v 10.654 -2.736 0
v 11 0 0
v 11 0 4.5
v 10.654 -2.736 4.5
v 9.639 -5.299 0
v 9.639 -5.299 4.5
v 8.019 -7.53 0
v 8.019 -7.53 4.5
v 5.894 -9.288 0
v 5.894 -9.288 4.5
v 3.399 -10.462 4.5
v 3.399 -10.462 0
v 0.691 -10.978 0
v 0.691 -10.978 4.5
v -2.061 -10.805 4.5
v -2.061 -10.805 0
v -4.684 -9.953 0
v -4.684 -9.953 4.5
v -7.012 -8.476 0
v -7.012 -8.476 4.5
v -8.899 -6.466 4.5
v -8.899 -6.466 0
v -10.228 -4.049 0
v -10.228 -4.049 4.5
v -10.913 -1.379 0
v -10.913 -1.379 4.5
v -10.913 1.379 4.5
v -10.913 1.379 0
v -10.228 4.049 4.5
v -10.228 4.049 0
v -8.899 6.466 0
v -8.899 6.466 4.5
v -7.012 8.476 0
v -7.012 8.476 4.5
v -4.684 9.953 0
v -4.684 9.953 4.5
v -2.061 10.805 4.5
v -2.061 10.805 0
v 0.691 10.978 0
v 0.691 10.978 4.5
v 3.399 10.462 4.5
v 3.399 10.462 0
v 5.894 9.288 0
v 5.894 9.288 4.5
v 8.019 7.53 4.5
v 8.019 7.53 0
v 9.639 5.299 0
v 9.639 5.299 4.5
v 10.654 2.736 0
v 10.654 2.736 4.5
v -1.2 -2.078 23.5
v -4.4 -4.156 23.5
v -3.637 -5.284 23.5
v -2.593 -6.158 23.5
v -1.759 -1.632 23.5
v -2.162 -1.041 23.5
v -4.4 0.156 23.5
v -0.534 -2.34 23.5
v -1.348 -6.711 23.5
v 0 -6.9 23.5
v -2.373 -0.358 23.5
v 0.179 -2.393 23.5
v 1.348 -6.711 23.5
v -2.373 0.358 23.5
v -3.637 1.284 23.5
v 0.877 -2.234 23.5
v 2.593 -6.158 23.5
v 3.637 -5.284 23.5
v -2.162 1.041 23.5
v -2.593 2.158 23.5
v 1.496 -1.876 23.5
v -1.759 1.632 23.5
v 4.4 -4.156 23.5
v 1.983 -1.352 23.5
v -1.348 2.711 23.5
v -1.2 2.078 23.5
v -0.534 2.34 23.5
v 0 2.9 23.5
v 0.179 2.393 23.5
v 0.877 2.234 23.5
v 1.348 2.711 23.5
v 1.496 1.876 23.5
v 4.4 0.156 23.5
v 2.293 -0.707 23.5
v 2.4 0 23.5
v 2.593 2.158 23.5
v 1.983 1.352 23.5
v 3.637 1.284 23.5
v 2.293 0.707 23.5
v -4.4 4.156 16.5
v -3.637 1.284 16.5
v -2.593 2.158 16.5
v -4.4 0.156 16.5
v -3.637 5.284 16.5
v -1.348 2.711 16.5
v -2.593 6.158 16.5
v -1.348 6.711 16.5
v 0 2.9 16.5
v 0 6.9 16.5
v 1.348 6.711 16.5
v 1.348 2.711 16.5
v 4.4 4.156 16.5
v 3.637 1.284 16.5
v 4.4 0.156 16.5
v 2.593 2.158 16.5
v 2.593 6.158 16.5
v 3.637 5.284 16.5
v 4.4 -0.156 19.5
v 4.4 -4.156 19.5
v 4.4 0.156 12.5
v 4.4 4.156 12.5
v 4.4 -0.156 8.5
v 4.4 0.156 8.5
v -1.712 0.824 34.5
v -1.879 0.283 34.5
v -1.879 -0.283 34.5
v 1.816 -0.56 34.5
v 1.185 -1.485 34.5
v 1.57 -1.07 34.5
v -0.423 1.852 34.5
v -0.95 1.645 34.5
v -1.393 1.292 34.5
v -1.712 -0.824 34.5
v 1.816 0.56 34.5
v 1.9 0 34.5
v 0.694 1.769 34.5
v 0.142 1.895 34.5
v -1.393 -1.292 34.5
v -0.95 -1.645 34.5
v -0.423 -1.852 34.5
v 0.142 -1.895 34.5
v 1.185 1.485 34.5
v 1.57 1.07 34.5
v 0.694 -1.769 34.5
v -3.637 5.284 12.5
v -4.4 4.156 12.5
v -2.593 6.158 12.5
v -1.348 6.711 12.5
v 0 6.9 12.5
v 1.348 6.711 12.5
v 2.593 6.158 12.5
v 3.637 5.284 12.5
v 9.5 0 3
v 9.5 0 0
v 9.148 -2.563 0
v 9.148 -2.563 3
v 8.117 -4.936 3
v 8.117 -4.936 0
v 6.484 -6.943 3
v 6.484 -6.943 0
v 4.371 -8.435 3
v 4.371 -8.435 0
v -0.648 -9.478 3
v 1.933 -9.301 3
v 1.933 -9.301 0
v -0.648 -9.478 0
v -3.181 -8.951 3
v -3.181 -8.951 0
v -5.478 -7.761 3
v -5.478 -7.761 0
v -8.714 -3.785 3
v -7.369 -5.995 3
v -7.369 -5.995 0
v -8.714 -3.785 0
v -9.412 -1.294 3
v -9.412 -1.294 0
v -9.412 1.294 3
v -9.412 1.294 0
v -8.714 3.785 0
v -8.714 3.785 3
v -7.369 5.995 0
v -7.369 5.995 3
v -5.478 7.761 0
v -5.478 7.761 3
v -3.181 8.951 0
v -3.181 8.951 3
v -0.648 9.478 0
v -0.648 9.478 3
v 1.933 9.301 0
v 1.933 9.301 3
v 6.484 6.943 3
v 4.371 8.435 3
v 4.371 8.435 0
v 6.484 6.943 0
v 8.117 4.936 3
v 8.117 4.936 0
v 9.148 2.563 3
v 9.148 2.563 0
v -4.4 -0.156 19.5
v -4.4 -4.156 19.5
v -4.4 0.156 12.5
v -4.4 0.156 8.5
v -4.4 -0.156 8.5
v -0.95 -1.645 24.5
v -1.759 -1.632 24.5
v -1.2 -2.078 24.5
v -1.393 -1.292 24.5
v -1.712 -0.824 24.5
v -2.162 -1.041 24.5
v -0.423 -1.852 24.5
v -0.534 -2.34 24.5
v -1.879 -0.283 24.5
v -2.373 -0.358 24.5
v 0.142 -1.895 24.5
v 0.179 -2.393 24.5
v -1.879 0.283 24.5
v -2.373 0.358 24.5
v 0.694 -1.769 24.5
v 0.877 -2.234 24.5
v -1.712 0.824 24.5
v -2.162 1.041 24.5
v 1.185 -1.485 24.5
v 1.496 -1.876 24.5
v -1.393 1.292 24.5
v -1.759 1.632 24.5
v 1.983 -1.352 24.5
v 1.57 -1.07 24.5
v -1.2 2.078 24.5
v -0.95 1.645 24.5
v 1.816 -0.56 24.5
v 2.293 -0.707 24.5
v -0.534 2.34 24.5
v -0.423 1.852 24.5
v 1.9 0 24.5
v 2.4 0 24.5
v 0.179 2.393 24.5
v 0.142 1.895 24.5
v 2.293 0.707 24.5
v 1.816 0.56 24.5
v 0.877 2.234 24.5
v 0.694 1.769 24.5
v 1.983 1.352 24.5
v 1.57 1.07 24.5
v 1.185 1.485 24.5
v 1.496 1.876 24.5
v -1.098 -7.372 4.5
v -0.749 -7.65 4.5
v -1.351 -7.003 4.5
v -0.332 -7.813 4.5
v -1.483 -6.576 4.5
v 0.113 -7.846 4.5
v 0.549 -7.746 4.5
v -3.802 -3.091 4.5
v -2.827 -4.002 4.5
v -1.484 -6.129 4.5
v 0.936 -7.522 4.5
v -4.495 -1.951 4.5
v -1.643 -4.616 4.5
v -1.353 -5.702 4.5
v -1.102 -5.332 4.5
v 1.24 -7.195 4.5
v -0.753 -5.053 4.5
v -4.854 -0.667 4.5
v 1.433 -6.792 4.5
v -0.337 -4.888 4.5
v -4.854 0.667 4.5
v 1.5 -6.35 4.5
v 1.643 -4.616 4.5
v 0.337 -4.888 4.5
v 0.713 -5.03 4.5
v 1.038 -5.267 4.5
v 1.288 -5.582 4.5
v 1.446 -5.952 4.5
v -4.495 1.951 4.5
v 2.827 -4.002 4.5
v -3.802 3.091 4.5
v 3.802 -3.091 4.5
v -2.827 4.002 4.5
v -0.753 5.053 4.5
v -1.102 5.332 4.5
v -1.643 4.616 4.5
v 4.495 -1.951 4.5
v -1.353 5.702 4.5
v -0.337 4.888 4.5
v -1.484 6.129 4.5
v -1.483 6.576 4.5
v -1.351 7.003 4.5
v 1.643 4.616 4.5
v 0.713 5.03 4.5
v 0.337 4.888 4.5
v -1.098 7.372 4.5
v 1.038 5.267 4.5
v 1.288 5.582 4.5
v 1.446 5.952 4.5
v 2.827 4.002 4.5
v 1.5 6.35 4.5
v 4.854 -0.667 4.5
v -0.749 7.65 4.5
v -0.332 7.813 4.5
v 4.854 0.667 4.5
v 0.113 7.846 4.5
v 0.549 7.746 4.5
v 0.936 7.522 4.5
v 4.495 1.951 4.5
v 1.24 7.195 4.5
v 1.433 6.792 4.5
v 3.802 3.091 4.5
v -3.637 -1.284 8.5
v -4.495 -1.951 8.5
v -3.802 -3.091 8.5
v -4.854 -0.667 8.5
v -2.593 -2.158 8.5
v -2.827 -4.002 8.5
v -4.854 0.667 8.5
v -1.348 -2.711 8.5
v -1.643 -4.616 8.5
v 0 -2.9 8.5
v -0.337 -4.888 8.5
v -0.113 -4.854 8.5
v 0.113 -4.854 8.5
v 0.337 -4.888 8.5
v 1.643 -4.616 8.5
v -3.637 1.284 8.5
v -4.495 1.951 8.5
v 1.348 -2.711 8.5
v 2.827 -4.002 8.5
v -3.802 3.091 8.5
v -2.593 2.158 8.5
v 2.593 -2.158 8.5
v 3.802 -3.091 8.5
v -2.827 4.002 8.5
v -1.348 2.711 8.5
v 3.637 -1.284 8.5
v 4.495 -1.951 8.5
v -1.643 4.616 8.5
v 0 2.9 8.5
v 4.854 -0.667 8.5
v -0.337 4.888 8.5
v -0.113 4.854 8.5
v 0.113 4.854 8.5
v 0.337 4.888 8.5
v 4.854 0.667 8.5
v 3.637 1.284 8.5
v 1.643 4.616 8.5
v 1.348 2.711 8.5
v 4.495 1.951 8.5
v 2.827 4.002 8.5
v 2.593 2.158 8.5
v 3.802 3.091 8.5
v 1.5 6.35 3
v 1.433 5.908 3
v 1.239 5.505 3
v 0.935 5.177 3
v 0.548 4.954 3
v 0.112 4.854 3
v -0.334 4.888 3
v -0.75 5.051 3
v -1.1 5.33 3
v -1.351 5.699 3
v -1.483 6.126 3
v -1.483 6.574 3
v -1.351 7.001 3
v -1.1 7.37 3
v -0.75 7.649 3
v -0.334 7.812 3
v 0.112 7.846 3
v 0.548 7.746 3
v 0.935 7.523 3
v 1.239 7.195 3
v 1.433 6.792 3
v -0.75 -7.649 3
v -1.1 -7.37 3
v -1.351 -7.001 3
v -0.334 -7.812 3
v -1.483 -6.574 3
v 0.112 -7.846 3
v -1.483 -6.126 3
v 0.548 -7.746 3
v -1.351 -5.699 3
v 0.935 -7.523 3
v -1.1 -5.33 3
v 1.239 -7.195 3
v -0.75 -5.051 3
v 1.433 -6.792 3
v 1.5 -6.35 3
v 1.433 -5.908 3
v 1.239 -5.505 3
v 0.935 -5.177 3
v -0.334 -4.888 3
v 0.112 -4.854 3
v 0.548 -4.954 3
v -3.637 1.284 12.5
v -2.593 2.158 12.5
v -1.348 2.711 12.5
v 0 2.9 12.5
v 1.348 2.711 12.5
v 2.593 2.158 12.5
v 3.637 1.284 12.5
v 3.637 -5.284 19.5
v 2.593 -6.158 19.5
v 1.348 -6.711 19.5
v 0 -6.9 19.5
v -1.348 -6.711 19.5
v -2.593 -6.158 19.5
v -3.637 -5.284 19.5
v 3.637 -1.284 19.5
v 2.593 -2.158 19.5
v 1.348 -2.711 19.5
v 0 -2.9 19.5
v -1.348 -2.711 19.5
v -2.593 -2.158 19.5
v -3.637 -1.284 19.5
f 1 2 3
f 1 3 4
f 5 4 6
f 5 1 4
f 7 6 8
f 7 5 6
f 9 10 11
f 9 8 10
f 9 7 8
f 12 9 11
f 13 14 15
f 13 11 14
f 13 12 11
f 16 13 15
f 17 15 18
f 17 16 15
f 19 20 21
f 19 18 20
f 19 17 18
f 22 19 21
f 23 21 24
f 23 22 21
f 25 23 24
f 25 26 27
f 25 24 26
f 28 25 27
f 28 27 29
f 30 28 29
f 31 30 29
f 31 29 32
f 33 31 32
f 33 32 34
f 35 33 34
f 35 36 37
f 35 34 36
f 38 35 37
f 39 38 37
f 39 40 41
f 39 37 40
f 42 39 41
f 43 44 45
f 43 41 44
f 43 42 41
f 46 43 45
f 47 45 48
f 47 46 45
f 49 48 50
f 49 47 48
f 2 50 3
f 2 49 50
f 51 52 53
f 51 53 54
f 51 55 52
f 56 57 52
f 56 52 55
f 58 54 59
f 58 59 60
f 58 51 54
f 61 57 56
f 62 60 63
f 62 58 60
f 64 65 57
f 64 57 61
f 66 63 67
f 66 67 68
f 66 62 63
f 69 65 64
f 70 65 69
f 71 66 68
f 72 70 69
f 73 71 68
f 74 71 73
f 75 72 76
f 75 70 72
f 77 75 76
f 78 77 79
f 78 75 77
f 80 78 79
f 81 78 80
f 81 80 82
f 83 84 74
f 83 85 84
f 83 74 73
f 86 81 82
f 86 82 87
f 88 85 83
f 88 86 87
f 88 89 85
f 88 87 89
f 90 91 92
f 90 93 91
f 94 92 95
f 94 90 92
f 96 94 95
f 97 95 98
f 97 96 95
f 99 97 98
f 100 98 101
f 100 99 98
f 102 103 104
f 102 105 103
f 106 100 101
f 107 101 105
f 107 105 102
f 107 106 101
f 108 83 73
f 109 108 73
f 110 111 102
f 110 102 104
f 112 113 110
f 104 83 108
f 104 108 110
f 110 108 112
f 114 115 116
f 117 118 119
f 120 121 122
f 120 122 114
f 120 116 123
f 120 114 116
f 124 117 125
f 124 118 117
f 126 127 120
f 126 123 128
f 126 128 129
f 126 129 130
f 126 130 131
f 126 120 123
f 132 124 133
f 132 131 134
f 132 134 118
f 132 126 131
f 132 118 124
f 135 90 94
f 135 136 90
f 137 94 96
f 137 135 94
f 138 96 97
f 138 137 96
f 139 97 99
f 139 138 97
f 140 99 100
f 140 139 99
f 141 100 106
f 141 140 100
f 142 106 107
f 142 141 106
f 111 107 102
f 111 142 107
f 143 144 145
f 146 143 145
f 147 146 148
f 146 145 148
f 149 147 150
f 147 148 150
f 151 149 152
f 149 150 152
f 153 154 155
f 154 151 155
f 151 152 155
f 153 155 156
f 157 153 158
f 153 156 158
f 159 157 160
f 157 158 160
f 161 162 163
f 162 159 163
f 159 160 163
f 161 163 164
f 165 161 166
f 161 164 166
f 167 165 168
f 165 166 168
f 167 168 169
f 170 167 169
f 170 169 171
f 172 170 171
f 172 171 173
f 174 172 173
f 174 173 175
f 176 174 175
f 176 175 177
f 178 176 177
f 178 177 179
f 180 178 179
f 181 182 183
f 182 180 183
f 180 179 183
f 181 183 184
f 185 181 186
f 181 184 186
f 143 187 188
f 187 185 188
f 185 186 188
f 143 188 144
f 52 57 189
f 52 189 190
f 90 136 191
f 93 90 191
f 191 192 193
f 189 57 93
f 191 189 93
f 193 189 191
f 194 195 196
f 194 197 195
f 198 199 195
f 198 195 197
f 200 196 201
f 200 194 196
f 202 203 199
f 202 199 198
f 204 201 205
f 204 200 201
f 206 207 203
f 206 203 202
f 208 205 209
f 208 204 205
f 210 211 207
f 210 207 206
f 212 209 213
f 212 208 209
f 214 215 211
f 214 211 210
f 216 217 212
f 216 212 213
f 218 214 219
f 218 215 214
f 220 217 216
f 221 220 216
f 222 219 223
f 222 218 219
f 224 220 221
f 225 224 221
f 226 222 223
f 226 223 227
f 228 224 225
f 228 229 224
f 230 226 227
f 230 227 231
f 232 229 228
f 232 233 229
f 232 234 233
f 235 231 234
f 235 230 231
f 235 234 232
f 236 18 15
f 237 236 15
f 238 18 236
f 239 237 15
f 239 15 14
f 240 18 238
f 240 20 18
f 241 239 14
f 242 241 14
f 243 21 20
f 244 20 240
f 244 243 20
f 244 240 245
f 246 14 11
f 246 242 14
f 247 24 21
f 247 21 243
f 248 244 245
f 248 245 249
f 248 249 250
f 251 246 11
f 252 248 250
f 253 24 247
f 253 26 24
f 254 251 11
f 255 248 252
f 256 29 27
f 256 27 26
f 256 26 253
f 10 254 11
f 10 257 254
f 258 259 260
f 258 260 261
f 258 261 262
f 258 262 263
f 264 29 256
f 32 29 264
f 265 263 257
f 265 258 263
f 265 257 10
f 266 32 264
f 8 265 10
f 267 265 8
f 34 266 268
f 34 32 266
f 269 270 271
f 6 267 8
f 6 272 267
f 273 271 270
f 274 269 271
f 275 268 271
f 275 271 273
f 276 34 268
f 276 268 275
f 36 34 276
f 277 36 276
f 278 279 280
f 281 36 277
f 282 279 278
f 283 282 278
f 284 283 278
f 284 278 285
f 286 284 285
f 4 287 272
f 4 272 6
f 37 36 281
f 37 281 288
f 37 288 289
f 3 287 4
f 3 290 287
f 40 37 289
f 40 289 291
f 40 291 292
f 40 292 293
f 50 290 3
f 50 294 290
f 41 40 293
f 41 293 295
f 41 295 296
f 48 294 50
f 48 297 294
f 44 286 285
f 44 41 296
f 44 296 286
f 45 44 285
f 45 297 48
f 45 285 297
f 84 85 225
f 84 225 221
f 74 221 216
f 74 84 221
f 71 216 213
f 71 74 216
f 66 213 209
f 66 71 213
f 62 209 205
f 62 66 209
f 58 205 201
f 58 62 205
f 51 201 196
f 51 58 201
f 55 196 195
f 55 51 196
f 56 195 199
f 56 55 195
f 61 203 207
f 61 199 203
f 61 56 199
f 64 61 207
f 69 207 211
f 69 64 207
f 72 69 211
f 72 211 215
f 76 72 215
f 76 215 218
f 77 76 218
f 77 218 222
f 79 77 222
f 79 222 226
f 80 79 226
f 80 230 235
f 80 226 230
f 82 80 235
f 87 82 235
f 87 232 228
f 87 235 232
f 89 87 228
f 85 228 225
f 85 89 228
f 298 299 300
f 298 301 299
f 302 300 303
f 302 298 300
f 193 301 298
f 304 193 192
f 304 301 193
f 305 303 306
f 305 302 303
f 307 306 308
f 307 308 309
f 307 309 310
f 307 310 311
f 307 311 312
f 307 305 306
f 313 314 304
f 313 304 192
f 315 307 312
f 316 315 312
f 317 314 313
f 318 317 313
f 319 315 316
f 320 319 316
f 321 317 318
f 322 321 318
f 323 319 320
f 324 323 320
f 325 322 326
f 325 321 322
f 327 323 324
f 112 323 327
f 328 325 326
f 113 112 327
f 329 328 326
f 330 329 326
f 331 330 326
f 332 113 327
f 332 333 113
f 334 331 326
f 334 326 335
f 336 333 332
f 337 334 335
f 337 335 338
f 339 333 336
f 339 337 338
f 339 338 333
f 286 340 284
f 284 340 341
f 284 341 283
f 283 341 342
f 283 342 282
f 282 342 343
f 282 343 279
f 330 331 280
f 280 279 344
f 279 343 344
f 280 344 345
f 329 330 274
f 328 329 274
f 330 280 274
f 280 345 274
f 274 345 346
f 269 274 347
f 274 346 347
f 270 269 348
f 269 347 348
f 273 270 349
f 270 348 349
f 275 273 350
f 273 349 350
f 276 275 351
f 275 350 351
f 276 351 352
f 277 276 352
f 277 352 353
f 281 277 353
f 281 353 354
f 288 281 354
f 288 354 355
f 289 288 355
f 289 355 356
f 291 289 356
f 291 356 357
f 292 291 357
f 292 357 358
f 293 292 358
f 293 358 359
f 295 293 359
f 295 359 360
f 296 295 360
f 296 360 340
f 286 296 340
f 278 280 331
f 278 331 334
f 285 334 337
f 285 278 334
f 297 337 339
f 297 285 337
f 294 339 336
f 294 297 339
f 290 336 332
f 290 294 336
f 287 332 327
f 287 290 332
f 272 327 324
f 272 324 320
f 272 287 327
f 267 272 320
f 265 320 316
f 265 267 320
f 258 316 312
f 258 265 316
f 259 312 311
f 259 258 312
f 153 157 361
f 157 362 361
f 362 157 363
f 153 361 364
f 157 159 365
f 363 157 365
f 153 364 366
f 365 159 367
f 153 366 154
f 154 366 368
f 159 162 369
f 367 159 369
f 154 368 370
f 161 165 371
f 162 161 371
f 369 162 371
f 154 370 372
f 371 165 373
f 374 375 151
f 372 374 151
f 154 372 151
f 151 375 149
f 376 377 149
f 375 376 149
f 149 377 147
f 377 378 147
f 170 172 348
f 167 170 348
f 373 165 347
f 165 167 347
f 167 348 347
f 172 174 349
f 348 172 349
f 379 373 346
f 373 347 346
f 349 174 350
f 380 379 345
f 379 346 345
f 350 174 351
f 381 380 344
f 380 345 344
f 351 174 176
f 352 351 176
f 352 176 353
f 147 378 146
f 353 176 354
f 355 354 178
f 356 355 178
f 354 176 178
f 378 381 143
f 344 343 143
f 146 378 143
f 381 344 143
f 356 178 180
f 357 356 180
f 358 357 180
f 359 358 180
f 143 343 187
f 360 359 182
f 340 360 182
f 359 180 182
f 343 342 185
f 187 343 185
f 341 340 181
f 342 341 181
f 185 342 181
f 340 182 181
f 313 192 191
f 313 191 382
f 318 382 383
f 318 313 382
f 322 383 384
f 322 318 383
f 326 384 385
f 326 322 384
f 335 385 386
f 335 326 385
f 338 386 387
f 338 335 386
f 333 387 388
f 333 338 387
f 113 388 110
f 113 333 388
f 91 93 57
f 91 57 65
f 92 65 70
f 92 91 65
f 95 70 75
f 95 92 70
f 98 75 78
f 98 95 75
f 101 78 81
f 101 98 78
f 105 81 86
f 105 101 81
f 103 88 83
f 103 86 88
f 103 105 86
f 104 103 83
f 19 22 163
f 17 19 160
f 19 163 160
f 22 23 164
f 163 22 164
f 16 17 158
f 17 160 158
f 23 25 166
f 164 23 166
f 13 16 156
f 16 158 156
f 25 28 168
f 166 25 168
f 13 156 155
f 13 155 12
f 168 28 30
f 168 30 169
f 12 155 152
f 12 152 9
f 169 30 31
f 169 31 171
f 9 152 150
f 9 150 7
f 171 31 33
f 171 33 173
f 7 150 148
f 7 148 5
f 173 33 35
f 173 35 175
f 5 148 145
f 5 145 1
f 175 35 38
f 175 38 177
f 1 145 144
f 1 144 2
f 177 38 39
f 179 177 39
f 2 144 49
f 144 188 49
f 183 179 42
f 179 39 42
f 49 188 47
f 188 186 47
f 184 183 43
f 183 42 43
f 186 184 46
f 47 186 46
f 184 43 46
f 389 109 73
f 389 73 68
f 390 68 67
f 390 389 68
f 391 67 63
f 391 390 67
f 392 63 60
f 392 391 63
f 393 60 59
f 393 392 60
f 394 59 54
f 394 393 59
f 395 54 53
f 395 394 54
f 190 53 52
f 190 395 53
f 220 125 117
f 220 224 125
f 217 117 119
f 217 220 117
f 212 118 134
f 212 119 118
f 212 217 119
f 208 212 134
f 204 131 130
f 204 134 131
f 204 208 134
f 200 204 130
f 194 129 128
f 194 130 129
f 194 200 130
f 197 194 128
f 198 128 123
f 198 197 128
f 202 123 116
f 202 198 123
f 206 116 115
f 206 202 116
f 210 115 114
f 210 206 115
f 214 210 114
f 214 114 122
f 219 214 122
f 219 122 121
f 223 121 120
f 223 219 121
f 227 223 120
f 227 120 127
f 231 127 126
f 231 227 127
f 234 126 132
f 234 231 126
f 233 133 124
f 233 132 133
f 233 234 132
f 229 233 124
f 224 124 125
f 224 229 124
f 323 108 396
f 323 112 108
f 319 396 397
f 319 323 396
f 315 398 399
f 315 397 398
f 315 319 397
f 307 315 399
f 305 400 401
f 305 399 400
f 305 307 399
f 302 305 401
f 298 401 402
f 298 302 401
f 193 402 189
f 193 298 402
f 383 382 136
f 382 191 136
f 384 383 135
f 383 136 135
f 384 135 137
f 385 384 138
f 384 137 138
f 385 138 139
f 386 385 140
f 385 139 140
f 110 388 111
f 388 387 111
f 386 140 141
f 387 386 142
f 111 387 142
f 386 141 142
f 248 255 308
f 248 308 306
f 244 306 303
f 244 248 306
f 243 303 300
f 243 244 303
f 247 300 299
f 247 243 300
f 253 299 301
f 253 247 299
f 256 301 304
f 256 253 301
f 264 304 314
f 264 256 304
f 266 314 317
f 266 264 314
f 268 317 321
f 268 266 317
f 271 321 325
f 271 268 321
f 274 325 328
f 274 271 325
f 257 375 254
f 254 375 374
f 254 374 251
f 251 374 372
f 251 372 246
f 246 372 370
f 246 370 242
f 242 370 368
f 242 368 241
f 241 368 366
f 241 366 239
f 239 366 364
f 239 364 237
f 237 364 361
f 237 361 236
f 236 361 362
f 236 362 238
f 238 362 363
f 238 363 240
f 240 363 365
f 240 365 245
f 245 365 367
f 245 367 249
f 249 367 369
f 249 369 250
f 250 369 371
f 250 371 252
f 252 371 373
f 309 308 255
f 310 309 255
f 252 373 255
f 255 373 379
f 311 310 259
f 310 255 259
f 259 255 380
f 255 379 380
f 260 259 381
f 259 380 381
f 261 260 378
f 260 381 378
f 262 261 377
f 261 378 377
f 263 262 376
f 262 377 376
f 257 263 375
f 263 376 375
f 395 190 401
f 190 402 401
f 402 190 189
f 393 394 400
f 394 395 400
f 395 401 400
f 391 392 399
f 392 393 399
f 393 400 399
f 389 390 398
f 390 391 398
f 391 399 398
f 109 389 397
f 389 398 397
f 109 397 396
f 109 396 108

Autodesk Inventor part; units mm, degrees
ref_plane "YZ Plane" through (0, 0, 0) normal (1, 0, 0) x (0, 1, 0)
ref_plane "XZ Plane" through (0, 0, 0) normal (0, 1, 0) x (-1, 0, 0)
ref_plane "XY Plane" through (0, 0, 0) normal (0, 0, 1) x (1, 0, 0)
sketch "Skizze1" plane through (0, 0, 0) normal (0, 0, 1) x (1, 0, 0)
  line L0 (0, 15.4) -> (0, -15.4) construction
  line L1 (-15.4, 0) -> (15.4, 0) construction
  circle A0 centre (0, 0) radius 1.9
  arc A1 (-4.4, -4.1564) -> (4.4, -4.1564) centre (0, -2) ccw
  line L2 (0, 2) -> (0, 0) construction
  line L3 (0, 0) -> (2, 0) construction
  arc A2 (-4.4, -0.1564) -> (4.4, -0.1564) centre (0, 2) ccw
  arc A3 (4.4, 0.1564) -> (-4.4, 0.1564) centre (0, -2) ccw
  line L4 (0, 0) -> (0, -2) construction
  circle A4 centre (0, 0) radius 9.5
  circle A5 centre (0, 0) radius 11
  circle A6 centre (0, 0) radius 6.35 construction
  circle A7 centre (0, -6.35) radius 1.5
  circle A8 centre (0, 6.35) radius 1.5
  line L5 (0, -6.35) -> (0, 0) construction
  line L6 (0, 0) -> (-6.35, 0) construction
  line L7 (4.4, 4.1564) -> (4.4, -4.1564)
  line L8 (-4.4, 4.1564) -> (-4.4, -4.1564)
  line L9 (4.9, 2) -> (4.9, -2) construction
  arc A9 (4.4, 4.1564) -> (-4.4, 4.1564) centre (0, 2) ccw
  arc A10 (4.4, -0.1564) -> (4.4, 4.1564) centre (0, 2) ccw construction
  arc A11 (4.4, -4.1564) -> (4.4, 0.1564) centre (0, -2) ccw construction
  arc A12 (-4.4, 4.1564) -> (-4.4, -0.1564) centre (0, 2) ccw construction
  arc A13 (-4.4, 0.1564) -> (-4.4, -4.1564) centre (0, -2) ccw construction
  line L10 (-4.9, 2) -> (-4.9, -2) construction
  circle A14 centre (0, 0) radius 2.4
  circle A15 centre (0, 2) radius 5.9
  circle A16 centre (0, -6.35) radius 2.5
  circle A17 centre (0, 6.35) radius 2.5
  circle A18 centre (0, -2) radius 5.9
  circle A19 centre (0, 0) radius 4.9
  dimension "d0" = 3.8
  dimension "d1" = 2
  dimension "d14" = 2
  dimension "d15" = 180
  dimension "d16" = 9.5
  dimension "d17" = 1.5
  dimension "d20" = 6.35
  dimension "d21" = 3
  dimension "d26" = 0.5
  dimension "d27" = 0.5
  dimension "d28" = 4.9
  dimension "d31" = 0.5
  dimension "d34" = 1
  dimension "d37" = 1
  dimension "d40" = 1
extrude "Extrusion6" add sketch "Skizze1" along normal blind 3 contours A5
extrude "Extrusion7" add sketch "Skizze1" along normal blind 1.5 from surface at 3 contours A0 | L8 A19 A16 A1 | A1 A16 A18 A15 A19 L8 | A16 A19 A7 A1 | A1 A7 A16 A18 | A19 A15 L8 | L8 A15 A16 A19 | A7 A19 A1 | A1 A7 | A16 A15 A19 A7 | A18 A16 | A15 A19 A18 L8 | L8 A2 L7 A15 A16 | A15 A18 A19 | A7 A19 A16 A1 | A7 A19 | A16 A15 | A16 A1 L7 A19 A15 A18 | A15 A17 A9 L8 A19 A18 | L8 A3 L7 A2 | A19 L8 A18 | A16 A19 L7 A1 | A15 L7 A19 A16 | A17 A15 | A15 A17 A9 A8 | L7 A18 A19 A15 | L8 A18 A17 L7 A3 | L8 A19 A17 A18 | L8 A9 A17 A19 | A15 A19 L7 | A18 A19 L7 A9 A17 A15 | A15 A19 A18 | A9 A8 A19 A17 | A18 A17 | A17 A19 A8 A18 | A18 L7 A19 | A9 A8 A19 | A8 A9 | A18 A17 A19 L7 | A19 A8 | A19 A17 A9 L7 | A17 A19 A8 A9 | A4 | A5 | A14
extrude "Extrusion15" add sketch "Skizze1" along normal blind 4 from surface at 4.5 contours A0 | A19 A15 L8 | L8 A15 A16 A19 | A16 A15 A19 A7 | A15 A19 A18 L8 | L8 A2 L7 A15 A16 | A7 A19 | A16 A15 | L8 A3 L7 A2 | A19 L8 A18 | A15 L7 A19 A16 | L7 A18 A19 A15 | L8 A18 A17 L7 A3 | L8 A19 A17 A18 | A15 A19 L7 | A18 A17 | A17 A19 A8 A18 | A18 L7 A19 | A18 A17 A19 L7 | A19 A8 | A14
extrude "Extrusion8" cut sketch "Skizze1" along normal through all both and the other way through all contours A7 A19 A1 | A1 A7 | A7 A19 | A9 A8 A19 | A8 A9 | A19 A8
extrude "Extrusion16" add sketch "Skizze1" along normal blind 4 from surface at 8.5 contours A0 | L8 A3 L7 A2 | A14
extrude "Extrusion12" cut sketch "Skizze1" along normal blind 3 from surface at 12.5 contours A16 A19 A7 A1 | A1 A7 A16 A18 | A16 A15 A19 A7 | A18 A16 | A7 A19 A16 A1 | A16 A15 | A17 A15 | A15 A17 A9 A8 | A9 A8 A19 A17 | A18 A17 | A17 A19 A8 A18 | A9 A8 A19 | A8 A9 | A19 A8 | A17 A19 A8 A9
extrude "Extrusion2" add sketch "Skizze1" along normal blind 4 from surface at 12.5 contours A0 | L8 A3 L7 A2 | L8 A18 A17 L7 A3 | L8 A19 A17 A18 | L8 A9 A17 A19 | A9 A8 A19 A17 | A18 A17 | A17 A19 A8 A18 | A9 A8 A19 | A18 A17 A19 L7 | A19 A8 | A19 A17 A9 L7 | A17 A19 A8 A9 | A14
extrude "Extrusion3" add sketch "Skizze1" along normal blind 3 from surface at 16.5 contours A0 | L8 A3 L7 A2 | A14
extrude "Extrusion4" add sketch "Skizze1" along normal blind 4 from surface at 19.5 contours A0 | L8 A19 A16 A1 | A16 A19 A7 A1 | L8 A15 A16 A19 | A7 A19 A1 | A16 A15 A19 A7 | L8 A2 L7 A15 A16 | A7 A19 A16 A1 | A7 A19 | A16 A15 | L8 A3 L7 A2 | A16 A19 L7 A1 | A15 L7 A19 A16 | A14
extrude "Extrusion10" add sketch "Skizze1" along normal blind 1 from surface at 23.5 contours A0 | A14
extrude "Extrusion14" add sketch "Skizze1" along normal blind 10 from surface at 24.5 contours A0
equation "\"d14\" = d1"
equation "\"d27\" = d26"
properties part number "ExcentricShaft"
